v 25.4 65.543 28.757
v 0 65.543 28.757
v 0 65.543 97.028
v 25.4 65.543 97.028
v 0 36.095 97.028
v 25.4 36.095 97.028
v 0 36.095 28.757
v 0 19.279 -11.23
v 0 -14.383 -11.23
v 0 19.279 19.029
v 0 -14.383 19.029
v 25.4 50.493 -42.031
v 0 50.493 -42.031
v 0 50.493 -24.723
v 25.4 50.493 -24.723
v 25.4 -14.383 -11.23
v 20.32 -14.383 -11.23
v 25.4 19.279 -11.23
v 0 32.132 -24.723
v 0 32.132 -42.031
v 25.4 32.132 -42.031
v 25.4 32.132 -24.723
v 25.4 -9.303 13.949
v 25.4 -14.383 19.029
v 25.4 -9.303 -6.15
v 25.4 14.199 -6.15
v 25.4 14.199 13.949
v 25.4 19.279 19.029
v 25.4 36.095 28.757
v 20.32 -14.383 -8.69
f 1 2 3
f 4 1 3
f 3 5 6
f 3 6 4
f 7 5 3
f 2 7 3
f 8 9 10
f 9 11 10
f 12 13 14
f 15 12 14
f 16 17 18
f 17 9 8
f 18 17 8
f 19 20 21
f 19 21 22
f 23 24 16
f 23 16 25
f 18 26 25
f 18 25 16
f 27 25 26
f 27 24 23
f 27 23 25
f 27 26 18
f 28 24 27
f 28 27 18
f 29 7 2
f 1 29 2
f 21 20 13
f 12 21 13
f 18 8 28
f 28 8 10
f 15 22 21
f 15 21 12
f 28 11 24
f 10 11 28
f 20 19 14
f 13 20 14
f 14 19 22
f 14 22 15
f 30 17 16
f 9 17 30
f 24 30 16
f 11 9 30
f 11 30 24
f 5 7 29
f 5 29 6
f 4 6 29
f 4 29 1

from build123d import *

# Parameters (mm, degrees)
F0_W     = 33.6623098701
F0_H     = 30.2589405328
F1_DEPTH = 25.4
F2_R     = 5.08
F3_T     = 2.54
F4_DEPTH = 25.4
F0_W_2   = 18.3612667024
F0_H_2   = 17.3079725355
F0_W_3   = 29.4476747513
F0_H_3   = 68.2704020292


# Not quite as in the source:
# - a shell that OpenCascade refuses in one call is made with other operations: the cavity is built on its own and cut out


with BuildPart() as f1:
    # F0 (on Right) → F1 (new body)
    with BuildSketch(Plane.YZ):
        with Locations((2.4481667206, 3.8996757939)):
            Rectangle(F0_W, F0_H)
    extrude(amount=F1_DEPTH)

    # F2
    f2_edges = [f1.edges().sort_by_distance(p)[0] for p in [
        (25.4, 2.448167, 19.029146),
        (25.4, -14.382988, 3.899676),
        (25.4, 2.448167, -11.229794),
        (25.4, 19.279322, 3.899676),
    ]]
    fillet(f2_edges, radius=F2_R)

    # F3: shell of thickness 2.54, made by hand


with BuildPart() as f3_core1:
    # F3_t2: copy of F1
    add(f1.part)

    # the walls: a layer under each face that stays
    f3_faces = [f3_core1.faces().sort_by_distance(p)[0] for p in [
        (10.16, 2.4481667206, 19.0291460603),
        (10.16, 19.2793216556, 3.8996757939),
        (23.9121024849, 2.4481667206, 17.5412484723),
        (23.9121024484, 17.7914241041, 3.8996757939),
        (23.9121024849, 2.4481667206, -9.7418968844),
    ]]
    thicken(f3_faces, amount=-F3_T, mode=Mode.SUBTRACT)


with BuildPart() as f1_1:
    add(f1.part)

    # what is left inside the walls is the cavity
    f3_cavity = [f3_core1.part.solids().sort_by_distance(p)[0] for p in [
        (0.0254, 1.178167, -1.990148),
    ]]
    add(f3_cavity, mode=Mode.SUBTRACT)

    # F0 (on Right) → F4 (join)
    with BuildSketch(Plane.YZ):
        with Locations((2.4481667206, 3.8996757939)):
            Rectangle(F0_W, F0_H)
    extrude(amount=F4_DEPTH)


with BuildPart() as f4:
    # F0 (on Right) → F4, piece 2 (new body)
    with BuildSketch(Plane.YZ):
        with Locations((41.3128491491, -33.3774806932)):
            Rectangle(F0_W_2, F0_H_2)
    extrude(amount=F4_DEPTH)


with BuildPart() as f4b:
    # F0 (on Right) → F4, piece 3 (new body)
    with BuildSketch(Plane.YZ):
        with Locations((50.818964839, 62.8925031051)):
            Rectangle(F0_W_3, F0_H_3)
    extrude(amount=F4_DEPTH)


solid = Compound([f1_1.part, f4.part, f4b.part])
